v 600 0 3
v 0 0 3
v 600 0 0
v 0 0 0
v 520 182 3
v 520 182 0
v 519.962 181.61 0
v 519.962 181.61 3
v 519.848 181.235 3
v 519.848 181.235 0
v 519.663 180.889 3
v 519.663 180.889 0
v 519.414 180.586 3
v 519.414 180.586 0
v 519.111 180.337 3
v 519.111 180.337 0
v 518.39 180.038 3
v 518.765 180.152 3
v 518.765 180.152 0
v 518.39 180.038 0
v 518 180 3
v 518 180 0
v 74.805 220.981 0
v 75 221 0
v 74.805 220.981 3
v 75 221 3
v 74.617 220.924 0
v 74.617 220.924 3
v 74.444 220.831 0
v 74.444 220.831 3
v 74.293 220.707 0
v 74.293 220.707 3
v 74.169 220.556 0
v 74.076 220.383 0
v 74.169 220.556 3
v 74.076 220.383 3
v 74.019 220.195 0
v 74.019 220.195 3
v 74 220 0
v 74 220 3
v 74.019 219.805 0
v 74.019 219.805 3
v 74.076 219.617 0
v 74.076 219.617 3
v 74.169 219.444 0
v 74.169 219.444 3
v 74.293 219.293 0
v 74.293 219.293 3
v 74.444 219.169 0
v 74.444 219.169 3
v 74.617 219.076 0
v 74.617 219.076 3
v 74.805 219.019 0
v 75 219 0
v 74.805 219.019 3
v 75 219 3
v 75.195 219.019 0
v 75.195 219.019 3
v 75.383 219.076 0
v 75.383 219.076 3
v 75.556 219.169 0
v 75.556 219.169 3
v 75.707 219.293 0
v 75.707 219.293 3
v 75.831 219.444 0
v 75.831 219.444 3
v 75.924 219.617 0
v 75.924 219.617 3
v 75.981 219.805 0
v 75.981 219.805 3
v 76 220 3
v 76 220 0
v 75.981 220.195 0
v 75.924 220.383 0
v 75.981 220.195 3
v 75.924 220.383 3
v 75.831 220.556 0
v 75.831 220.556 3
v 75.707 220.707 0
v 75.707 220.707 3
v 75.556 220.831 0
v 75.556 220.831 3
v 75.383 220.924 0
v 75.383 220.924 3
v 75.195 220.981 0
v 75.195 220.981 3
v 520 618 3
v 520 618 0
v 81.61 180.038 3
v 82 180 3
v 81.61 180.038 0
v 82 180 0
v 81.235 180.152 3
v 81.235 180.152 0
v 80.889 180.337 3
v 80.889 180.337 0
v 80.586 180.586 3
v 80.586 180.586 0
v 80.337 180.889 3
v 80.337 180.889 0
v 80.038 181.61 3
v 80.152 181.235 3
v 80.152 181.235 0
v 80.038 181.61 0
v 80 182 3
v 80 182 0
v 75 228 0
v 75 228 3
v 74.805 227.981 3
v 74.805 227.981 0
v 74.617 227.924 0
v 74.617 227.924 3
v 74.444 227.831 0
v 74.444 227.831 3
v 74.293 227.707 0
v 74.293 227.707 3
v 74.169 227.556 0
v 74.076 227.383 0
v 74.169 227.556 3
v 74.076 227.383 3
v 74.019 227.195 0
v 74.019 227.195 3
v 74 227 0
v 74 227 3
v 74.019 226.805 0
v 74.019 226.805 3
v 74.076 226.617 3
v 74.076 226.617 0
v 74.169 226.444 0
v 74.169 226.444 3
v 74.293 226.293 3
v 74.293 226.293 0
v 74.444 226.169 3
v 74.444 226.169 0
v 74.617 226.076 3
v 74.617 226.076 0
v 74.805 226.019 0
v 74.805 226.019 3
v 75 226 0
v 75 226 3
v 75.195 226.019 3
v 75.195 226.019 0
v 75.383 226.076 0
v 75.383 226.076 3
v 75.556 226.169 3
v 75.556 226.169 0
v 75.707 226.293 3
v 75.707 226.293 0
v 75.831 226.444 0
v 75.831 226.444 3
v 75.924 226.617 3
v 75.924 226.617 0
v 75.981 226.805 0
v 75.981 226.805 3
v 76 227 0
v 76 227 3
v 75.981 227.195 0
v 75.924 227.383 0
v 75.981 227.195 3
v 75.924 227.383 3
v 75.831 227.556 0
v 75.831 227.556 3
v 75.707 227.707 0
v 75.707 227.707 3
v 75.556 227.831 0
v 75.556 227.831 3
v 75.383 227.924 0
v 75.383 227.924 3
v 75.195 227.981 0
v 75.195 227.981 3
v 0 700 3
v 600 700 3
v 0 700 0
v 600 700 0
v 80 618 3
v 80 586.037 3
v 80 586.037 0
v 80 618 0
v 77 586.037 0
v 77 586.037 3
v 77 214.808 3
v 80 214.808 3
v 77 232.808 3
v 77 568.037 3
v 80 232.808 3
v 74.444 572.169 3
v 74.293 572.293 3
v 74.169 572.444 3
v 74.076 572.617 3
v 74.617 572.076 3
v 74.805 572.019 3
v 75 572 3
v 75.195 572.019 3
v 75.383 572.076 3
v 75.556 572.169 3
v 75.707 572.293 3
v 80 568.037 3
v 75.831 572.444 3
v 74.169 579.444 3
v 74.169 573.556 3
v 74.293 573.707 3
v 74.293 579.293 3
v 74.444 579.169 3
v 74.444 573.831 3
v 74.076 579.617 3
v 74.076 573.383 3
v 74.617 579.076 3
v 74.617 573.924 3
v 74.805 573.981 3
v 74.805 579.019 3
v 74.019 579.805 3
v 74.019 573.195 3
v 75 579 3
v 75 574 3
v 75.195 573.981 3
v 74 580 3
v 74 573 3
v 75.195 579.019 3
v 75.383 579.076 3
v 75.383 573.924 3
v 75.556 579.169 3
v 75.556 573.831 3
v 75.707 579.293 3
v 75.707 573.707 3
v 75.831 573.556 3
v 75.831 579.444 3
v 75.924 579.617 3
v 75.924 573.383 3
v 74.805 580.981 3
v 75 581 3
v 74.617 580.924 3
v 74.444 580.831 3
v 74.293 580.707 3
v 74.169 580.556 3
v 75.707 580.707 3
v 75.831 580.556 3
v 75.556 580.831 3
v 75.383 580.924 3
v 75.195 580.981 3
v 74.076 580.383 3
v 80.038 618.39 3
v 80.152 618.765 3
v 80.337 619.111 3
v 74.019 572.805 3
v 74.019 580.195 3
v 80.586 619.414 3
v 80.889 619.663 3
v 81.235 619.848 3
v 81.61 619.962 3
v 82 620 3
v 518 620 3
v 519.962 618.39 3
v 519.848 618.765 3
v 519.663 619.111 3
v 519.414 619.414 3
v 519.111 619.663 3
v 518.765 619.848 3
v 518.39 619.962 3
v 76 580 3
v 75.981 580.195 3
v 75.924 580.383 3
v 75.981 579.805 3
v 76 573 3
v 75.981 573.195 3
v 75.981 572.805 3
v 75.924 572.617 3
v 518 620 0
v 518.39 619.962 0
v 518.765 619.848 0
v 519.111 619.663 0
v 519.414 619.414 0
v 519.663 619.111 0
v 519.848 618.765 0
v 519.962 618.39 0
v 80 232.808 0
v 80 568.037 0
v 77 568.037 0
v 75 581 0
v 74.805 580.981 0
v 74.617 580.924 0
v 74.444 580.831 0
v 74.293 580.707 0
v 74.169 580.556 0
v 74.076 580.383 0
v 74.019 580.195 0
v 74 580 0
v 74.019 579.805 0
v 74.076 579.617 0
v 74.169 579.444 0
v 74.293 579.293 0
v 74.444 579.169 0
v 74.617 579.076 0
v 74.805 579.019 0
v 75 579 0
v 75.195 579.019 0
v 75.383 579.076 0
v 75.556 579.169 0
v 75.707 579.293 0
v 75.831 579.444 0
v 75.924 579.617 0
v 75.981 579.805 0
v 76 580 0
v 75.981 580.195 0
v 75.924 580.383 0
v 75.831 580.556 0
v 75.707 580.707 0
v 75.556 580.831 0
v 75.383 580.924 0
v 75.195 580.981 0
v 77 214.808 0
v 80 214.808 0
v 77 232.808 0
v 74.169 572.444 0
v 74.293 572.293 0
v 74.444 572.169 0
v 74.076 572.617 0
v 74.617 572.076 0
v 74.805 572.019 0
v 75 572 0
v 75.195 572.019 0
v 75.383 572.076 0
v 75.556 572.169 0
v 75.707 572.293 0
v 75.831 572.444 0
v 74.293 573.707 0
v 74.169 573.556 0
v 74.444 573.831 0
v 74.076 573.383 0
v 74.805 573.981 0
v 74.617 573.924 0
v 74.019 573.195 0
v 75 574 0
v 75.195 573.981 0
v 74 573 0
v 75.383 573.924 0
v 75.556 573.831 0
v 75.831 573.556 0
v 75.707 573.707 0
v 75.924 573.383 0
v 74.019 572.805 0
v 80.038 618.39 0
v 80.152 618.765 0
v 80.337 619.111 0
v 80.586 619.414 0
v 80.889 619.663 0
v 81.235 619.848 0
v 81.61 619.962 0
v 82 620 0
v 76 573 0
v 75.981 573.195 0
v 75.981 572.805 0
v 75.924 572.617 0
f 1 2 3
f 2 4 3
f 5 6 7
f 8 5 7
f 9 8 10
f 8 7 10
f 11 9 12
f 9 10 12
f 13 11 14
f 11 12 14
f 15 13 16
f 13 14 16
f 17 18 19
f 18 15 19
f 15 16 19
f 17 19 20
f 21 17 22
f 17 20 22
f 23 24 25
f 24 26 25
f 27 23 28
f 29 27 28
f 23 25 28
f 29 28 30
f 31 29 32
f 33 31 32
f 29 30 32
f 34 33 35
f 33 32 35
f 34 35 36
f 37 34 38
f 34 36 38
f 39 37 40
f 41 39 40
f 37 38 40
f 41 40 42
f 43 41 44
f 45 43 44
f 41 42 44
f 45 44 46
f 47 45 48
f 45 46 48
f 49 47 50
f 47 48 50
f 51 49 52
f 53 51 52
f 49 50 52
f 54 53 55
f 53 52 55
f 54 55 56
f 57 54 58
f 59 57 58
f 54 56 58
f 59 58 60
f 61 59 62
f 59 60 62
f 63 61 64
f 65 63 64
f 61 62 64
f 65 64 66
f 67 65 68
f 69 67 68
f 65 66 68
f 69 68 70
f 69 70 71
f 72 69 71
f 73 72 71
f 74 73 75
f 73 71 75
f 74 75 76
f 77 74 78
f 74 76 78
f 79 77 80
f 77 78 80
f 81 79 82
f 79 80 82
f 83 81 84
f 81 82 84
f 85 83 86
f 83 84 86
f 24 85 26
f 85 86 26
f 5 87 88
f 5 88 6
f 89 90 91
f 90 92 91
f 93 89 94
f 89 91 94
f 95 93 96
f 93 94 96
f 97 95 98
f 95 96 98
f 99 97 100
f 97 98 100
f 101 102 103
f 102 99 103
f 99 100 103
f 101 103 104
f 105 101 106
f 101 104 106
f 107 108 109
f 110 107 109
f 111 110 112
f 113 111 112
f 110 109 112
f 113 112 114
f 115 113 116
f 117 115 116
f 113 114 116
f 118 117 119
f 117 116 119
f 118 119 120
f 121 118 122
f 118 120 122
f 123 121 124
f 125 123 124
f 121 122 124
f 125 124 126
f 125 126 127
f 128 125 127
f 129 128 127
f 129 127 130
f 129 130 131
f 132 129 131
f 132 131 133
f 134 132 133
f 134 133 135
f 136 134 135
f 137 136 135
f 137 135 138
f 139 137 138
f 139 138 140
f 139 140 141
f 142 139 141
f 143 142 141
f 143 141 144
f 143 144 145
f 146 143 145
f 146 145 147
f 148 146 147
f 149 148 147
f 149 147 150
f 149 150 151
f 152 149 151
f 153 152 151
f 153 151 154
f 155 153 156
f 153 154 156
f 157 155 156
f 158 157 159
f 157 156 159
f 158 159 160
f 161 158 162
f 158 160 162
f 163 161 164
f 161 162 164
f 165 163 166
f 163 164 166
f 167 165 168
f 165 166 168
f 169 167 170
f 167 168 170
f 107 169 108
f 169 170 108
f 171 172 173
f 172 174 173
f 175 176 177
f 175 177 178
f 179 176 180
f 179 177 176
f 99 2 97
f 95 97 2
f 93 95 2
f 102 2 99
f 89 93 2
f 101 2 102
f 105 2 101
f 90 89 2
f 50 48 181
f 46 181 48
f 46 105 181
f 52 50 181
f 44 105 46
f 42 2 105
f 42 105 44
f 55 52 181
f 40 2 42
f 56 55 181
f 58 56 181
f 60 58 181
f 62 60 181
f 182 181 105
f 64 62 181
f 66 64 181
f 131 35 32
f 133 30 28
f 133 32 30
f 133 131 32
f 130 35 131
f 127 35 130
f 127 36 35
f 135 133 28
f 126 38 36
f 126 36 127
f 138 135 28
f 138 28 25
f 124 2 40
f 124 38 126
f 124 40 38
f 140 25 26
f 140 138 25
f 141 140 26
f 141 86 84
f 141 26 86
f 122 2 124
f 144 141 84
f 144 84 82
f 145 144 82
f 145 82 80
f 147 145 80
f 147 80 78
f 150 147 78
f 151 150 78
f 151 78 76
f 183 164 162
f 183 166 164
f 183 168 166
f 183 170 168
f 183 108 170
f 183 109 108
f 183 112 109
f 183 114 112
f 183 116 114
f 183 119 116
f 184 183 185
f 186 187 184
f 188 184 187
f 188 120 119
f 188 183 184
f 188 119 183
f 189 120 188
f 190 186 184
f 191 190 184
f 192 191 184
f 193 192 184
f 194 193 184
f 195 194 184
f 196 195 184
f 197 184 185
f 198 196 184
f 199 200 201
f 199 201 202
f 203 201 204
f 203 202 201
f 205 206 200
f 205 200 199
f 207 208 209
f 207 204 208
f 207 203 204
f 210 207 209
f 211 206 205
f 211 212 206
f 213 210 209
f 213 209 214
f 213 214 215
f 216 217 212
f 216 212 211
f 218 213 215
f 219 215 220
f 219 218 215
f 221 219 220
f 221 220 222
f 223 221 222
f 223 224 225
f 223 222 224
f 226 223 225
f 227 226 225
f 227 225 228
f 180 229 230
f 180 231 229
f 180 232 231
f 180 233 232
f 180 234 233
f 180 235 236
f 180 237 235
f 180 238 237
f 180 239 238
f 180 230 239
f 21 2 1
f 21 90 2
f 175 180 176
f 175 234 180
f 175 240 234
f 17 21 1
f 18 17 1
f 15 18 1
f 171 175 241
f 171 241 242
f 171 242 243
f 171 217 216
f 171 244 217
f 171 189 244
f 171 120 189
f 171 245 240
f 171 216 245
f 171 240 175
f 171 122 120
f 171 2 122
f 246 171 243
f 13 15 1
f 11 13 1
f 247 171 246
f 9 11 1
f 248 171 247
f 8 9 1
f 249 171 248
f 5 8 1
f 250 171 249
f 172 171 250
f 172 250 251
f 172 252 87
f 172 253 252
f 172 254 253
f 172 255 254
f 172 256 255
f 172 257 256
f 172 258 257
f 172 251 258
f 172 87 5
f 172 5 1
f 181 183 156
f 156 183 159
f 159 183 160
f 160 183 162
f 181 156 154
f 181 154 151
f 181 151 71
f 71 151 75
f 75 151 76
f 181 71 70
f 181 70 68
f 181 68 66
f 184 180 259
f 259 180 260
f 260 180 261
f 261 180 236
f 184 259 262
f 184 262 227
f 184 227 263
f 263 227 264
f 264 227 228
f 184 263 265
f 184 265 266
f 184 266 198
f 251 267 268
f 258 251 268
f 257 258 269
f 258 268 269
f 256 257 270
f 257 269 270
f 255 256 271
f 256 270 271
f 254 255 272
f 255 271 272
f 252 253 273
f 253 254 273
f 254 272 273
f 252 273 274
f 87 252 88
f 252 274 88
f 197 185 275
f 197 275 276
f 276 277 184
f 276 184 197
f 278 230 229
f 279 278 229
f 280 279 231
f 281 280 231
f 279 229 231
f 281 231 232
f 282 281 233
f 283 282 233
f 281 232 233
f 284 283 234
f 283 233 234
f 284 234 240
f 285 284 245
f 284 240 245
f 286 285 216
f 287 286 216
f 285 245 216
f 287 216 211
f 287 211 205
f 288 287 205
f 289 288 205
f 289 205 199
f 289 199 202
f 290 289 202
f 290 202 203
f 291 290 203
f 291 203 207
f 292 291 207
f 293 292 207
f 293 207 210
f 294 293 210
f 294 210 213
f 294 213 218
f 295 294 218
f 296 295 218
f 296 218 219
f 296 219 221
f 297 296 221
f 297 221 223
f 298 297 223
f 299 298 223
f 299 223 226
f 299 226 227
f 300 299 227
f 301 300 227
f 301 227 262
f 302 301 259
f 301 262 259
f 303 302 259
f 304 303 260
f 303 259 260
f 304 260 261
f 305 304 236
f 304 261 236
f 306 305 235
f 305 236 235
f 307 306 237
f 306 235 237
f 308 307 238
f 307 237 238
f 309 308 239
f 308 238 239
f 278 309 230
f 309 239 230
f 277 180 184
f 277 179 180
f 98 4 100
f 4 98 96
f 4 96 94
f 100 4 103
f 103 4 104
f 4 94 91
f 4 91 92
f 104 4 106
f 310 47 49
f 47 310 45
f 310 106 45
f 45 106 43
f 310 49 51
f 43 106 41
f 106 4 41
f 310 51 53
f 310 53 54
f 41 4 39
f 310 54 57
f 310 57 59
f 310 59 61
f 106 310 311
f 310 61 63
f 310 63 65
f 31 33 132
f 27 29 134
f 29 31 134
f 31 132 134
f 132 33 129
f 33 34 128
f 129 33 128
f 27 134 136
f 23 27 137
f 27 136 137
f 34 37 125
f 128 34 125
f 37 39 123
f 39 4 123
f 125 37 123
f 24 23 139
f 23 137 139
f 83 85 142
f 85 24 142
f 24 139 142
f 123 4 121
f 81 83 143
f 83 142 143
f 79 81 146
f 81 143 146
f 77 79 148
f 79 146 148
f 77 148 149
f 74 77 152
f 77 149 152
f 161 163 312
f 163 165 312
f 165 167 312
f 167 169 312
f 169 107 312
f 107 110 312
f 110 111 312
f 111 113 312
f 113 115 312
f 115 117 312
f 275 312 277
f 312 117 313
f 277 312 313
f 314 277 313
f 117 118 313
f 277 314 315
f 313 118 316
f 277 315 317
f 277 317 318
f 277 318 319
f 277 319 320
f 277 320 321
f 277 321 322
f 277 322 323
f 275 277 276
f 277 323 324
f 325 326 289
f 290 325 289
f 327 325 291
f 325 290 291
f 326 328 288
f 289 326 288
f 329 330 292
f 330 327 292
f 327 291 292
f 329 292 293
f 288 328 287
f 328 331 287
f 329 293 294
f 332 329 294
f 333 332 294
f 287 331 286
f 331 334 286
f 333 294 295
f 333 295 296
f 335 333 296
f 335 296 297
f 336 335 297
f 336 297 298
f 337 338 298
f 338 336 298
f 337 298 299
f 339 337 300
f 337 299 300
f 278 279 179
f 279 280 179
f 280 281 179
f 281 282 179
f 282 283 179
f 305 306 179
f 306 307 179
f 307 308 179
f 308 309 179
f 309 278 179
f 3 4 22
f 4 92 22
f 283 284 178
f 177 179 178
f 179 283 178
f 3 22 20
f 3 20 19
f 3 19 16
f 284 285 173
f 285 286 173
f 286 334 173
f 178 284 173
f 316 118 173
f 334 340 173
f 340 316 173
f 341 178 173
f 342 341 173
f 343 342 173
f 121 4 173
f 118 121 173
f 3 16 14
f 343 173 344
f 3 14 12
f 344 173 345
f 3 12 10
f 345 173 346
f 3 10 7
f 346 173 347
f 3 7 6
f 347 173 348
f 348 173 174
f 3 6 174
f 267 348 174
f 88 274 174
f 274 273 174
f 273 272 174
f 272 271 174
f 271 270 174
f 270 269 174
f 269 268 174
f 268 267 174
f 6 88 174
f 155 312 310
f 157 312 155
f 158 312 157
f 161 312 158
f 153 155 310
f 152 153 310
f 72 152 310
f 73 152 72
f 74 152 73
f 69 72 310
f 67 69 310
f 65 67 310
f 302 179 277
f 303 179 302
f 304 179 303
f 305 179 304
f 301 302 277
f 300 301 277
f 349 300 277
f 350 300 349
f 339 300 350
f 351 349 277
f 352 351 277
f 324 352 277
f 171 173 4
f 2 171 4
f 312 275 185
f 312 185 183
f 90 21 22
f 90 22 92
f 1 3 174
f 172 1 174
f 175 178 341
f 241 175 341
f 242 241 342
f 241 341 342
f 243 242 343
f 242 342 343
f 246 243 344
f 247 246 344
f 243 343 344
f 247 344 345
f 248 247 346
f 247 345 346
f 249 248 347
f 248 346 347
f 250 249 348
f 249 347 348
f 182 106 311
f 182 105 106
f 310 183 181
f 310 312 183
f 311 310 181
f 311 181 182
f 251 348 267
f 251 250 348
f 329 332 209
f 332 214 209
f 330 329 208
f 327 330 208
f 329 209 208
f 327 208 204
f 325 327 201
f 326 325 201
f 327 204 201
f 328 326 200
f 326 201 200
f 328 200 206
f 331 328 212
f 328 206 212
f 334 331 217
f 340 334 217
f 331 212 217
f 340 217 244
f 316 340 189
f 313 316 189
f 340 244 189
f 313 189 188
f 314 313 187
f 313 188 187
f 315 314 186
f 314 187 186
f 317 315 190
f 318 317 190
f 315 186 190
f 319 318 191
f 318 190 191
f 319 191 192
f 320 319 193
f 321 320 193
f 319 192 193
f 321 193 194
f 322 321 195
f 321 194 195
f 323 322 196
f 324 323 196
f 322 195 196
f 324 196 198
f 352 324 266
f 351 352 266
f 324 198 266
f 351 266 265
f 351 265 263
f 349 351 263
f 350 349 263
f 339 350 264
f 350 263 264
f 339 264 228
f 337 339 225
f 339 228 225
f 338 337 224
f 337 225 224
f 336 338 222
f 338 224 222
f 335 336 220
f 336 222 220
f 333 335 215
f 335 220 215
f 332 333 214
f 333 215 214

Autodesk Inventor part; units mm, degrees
ref_plane "YZ Plane" through (0, 0, 0) normal (1, 0, 0) x (0, 1, 0)
ref_plane "XZ Plane" through (0, 0, 0) normal (0, 1, 0) x (-1, 0, 0)
ref_plane "XY Plane" through (0, 0, 0) normal (0, 0, 1) x (1, 0, 0)
sketch "Esboço1" plane through (0, 0, 0) normal (0, 0, 1) x (1, 0, 0)
  line L0 (0, 0) -> (600, 0)
  line L1 (600, 0) -> (600, 700)
  line L2 (600, 700) -> (0, 700)
  line L3 (0, 700) -> (0, 0)
  dimension "d0" = 600
  dimension "d1" = 700
extrude "Extrusão1" add sketch "Esboço1" along normal blind 3
sketch "Esboço2" plane through (0, 0, 3) normal (0, 0, 1) x (1, 0, 0)
  line L0 (80, 620) -> (520, 620)
  line L1 (520, 620) -> (520, 180)
  line L2 (520, 180) -> (80, 180)
  line L3 (80, 180) -> (80, 620)
  line L4 (0, 700) -> (0, 0) projected
  line L5 (600, 0) -> (600, 700) projected
  line L6 (600, 700) -> (0, 700) projected
  line L7 (0, 0) -> (600, 0) projected
  dimension "d4" = 80
  dimension "d5" = 80
  dimension "d6" = 80
  dimension "d7" = 180
extrude "Extrusão2" cut sketch "Esboço2" against normal blind 10 contours L0 L1 L2 L3
fillet "Arredondamento1" radius 2 4 edges at (80, 620, 1.5) (520, 620, 1.5) (520, 180, 1.5) (80, 180, 1.5)
sketch "Esboço3" plane through (0, 0, 0) normal (0, 0, -1) x (-1, 0, 0)
  point P0 (0, 0)
  point P1 (-75, 220)
  point P2 (-75, 227)
  point P3 (-75, 580)
  point P4 (-75, 573)
hole "Furo1" at (75, 220, 0) at (75, 227, 0) at (75, 580, 0) at (75, 573, 0) direction (0, 0, 1) diameter 2 end through all
sketch "Esboço4" plane through (0, 0, 0) normal (0, 0, -1) x (-1, 0, 0)
  line L0 (-80, 618) -> (-80, 182) projected
  line L1 (-80, 232.8077) -> (-77, 232.8077)
  line L2 (-77, 232.8077) -> (-77, 214.8077)
  line L3 (-77, 214.8077) -> (-80, 214.8077)
  line L4 (-80, 214.8077) -> (-80, 232.8077)
  line L5 (-80, 586.0371) -> (-77, 586.0371)
  line L6 (-77, 586.0371) -> (-77, 568.0371)
  line L7 (-77, 568.0371) -> (-80, 568.0371)
  line L8 (-80, 568.0371) -> (-80, 586.0371)
  point P0 (0, 0)
  point P1 (-80, 586.0371)
  dimension "d19" = 3
  dimension "d20" = 18
  dimension "d21" = 3
  dimension "d22" = 18
extrude "Extrusão3" cut sketch "Esboço4" against normal blind 10
properties part number "frente" material "MDF - Chapa de fibra de média densidade"
